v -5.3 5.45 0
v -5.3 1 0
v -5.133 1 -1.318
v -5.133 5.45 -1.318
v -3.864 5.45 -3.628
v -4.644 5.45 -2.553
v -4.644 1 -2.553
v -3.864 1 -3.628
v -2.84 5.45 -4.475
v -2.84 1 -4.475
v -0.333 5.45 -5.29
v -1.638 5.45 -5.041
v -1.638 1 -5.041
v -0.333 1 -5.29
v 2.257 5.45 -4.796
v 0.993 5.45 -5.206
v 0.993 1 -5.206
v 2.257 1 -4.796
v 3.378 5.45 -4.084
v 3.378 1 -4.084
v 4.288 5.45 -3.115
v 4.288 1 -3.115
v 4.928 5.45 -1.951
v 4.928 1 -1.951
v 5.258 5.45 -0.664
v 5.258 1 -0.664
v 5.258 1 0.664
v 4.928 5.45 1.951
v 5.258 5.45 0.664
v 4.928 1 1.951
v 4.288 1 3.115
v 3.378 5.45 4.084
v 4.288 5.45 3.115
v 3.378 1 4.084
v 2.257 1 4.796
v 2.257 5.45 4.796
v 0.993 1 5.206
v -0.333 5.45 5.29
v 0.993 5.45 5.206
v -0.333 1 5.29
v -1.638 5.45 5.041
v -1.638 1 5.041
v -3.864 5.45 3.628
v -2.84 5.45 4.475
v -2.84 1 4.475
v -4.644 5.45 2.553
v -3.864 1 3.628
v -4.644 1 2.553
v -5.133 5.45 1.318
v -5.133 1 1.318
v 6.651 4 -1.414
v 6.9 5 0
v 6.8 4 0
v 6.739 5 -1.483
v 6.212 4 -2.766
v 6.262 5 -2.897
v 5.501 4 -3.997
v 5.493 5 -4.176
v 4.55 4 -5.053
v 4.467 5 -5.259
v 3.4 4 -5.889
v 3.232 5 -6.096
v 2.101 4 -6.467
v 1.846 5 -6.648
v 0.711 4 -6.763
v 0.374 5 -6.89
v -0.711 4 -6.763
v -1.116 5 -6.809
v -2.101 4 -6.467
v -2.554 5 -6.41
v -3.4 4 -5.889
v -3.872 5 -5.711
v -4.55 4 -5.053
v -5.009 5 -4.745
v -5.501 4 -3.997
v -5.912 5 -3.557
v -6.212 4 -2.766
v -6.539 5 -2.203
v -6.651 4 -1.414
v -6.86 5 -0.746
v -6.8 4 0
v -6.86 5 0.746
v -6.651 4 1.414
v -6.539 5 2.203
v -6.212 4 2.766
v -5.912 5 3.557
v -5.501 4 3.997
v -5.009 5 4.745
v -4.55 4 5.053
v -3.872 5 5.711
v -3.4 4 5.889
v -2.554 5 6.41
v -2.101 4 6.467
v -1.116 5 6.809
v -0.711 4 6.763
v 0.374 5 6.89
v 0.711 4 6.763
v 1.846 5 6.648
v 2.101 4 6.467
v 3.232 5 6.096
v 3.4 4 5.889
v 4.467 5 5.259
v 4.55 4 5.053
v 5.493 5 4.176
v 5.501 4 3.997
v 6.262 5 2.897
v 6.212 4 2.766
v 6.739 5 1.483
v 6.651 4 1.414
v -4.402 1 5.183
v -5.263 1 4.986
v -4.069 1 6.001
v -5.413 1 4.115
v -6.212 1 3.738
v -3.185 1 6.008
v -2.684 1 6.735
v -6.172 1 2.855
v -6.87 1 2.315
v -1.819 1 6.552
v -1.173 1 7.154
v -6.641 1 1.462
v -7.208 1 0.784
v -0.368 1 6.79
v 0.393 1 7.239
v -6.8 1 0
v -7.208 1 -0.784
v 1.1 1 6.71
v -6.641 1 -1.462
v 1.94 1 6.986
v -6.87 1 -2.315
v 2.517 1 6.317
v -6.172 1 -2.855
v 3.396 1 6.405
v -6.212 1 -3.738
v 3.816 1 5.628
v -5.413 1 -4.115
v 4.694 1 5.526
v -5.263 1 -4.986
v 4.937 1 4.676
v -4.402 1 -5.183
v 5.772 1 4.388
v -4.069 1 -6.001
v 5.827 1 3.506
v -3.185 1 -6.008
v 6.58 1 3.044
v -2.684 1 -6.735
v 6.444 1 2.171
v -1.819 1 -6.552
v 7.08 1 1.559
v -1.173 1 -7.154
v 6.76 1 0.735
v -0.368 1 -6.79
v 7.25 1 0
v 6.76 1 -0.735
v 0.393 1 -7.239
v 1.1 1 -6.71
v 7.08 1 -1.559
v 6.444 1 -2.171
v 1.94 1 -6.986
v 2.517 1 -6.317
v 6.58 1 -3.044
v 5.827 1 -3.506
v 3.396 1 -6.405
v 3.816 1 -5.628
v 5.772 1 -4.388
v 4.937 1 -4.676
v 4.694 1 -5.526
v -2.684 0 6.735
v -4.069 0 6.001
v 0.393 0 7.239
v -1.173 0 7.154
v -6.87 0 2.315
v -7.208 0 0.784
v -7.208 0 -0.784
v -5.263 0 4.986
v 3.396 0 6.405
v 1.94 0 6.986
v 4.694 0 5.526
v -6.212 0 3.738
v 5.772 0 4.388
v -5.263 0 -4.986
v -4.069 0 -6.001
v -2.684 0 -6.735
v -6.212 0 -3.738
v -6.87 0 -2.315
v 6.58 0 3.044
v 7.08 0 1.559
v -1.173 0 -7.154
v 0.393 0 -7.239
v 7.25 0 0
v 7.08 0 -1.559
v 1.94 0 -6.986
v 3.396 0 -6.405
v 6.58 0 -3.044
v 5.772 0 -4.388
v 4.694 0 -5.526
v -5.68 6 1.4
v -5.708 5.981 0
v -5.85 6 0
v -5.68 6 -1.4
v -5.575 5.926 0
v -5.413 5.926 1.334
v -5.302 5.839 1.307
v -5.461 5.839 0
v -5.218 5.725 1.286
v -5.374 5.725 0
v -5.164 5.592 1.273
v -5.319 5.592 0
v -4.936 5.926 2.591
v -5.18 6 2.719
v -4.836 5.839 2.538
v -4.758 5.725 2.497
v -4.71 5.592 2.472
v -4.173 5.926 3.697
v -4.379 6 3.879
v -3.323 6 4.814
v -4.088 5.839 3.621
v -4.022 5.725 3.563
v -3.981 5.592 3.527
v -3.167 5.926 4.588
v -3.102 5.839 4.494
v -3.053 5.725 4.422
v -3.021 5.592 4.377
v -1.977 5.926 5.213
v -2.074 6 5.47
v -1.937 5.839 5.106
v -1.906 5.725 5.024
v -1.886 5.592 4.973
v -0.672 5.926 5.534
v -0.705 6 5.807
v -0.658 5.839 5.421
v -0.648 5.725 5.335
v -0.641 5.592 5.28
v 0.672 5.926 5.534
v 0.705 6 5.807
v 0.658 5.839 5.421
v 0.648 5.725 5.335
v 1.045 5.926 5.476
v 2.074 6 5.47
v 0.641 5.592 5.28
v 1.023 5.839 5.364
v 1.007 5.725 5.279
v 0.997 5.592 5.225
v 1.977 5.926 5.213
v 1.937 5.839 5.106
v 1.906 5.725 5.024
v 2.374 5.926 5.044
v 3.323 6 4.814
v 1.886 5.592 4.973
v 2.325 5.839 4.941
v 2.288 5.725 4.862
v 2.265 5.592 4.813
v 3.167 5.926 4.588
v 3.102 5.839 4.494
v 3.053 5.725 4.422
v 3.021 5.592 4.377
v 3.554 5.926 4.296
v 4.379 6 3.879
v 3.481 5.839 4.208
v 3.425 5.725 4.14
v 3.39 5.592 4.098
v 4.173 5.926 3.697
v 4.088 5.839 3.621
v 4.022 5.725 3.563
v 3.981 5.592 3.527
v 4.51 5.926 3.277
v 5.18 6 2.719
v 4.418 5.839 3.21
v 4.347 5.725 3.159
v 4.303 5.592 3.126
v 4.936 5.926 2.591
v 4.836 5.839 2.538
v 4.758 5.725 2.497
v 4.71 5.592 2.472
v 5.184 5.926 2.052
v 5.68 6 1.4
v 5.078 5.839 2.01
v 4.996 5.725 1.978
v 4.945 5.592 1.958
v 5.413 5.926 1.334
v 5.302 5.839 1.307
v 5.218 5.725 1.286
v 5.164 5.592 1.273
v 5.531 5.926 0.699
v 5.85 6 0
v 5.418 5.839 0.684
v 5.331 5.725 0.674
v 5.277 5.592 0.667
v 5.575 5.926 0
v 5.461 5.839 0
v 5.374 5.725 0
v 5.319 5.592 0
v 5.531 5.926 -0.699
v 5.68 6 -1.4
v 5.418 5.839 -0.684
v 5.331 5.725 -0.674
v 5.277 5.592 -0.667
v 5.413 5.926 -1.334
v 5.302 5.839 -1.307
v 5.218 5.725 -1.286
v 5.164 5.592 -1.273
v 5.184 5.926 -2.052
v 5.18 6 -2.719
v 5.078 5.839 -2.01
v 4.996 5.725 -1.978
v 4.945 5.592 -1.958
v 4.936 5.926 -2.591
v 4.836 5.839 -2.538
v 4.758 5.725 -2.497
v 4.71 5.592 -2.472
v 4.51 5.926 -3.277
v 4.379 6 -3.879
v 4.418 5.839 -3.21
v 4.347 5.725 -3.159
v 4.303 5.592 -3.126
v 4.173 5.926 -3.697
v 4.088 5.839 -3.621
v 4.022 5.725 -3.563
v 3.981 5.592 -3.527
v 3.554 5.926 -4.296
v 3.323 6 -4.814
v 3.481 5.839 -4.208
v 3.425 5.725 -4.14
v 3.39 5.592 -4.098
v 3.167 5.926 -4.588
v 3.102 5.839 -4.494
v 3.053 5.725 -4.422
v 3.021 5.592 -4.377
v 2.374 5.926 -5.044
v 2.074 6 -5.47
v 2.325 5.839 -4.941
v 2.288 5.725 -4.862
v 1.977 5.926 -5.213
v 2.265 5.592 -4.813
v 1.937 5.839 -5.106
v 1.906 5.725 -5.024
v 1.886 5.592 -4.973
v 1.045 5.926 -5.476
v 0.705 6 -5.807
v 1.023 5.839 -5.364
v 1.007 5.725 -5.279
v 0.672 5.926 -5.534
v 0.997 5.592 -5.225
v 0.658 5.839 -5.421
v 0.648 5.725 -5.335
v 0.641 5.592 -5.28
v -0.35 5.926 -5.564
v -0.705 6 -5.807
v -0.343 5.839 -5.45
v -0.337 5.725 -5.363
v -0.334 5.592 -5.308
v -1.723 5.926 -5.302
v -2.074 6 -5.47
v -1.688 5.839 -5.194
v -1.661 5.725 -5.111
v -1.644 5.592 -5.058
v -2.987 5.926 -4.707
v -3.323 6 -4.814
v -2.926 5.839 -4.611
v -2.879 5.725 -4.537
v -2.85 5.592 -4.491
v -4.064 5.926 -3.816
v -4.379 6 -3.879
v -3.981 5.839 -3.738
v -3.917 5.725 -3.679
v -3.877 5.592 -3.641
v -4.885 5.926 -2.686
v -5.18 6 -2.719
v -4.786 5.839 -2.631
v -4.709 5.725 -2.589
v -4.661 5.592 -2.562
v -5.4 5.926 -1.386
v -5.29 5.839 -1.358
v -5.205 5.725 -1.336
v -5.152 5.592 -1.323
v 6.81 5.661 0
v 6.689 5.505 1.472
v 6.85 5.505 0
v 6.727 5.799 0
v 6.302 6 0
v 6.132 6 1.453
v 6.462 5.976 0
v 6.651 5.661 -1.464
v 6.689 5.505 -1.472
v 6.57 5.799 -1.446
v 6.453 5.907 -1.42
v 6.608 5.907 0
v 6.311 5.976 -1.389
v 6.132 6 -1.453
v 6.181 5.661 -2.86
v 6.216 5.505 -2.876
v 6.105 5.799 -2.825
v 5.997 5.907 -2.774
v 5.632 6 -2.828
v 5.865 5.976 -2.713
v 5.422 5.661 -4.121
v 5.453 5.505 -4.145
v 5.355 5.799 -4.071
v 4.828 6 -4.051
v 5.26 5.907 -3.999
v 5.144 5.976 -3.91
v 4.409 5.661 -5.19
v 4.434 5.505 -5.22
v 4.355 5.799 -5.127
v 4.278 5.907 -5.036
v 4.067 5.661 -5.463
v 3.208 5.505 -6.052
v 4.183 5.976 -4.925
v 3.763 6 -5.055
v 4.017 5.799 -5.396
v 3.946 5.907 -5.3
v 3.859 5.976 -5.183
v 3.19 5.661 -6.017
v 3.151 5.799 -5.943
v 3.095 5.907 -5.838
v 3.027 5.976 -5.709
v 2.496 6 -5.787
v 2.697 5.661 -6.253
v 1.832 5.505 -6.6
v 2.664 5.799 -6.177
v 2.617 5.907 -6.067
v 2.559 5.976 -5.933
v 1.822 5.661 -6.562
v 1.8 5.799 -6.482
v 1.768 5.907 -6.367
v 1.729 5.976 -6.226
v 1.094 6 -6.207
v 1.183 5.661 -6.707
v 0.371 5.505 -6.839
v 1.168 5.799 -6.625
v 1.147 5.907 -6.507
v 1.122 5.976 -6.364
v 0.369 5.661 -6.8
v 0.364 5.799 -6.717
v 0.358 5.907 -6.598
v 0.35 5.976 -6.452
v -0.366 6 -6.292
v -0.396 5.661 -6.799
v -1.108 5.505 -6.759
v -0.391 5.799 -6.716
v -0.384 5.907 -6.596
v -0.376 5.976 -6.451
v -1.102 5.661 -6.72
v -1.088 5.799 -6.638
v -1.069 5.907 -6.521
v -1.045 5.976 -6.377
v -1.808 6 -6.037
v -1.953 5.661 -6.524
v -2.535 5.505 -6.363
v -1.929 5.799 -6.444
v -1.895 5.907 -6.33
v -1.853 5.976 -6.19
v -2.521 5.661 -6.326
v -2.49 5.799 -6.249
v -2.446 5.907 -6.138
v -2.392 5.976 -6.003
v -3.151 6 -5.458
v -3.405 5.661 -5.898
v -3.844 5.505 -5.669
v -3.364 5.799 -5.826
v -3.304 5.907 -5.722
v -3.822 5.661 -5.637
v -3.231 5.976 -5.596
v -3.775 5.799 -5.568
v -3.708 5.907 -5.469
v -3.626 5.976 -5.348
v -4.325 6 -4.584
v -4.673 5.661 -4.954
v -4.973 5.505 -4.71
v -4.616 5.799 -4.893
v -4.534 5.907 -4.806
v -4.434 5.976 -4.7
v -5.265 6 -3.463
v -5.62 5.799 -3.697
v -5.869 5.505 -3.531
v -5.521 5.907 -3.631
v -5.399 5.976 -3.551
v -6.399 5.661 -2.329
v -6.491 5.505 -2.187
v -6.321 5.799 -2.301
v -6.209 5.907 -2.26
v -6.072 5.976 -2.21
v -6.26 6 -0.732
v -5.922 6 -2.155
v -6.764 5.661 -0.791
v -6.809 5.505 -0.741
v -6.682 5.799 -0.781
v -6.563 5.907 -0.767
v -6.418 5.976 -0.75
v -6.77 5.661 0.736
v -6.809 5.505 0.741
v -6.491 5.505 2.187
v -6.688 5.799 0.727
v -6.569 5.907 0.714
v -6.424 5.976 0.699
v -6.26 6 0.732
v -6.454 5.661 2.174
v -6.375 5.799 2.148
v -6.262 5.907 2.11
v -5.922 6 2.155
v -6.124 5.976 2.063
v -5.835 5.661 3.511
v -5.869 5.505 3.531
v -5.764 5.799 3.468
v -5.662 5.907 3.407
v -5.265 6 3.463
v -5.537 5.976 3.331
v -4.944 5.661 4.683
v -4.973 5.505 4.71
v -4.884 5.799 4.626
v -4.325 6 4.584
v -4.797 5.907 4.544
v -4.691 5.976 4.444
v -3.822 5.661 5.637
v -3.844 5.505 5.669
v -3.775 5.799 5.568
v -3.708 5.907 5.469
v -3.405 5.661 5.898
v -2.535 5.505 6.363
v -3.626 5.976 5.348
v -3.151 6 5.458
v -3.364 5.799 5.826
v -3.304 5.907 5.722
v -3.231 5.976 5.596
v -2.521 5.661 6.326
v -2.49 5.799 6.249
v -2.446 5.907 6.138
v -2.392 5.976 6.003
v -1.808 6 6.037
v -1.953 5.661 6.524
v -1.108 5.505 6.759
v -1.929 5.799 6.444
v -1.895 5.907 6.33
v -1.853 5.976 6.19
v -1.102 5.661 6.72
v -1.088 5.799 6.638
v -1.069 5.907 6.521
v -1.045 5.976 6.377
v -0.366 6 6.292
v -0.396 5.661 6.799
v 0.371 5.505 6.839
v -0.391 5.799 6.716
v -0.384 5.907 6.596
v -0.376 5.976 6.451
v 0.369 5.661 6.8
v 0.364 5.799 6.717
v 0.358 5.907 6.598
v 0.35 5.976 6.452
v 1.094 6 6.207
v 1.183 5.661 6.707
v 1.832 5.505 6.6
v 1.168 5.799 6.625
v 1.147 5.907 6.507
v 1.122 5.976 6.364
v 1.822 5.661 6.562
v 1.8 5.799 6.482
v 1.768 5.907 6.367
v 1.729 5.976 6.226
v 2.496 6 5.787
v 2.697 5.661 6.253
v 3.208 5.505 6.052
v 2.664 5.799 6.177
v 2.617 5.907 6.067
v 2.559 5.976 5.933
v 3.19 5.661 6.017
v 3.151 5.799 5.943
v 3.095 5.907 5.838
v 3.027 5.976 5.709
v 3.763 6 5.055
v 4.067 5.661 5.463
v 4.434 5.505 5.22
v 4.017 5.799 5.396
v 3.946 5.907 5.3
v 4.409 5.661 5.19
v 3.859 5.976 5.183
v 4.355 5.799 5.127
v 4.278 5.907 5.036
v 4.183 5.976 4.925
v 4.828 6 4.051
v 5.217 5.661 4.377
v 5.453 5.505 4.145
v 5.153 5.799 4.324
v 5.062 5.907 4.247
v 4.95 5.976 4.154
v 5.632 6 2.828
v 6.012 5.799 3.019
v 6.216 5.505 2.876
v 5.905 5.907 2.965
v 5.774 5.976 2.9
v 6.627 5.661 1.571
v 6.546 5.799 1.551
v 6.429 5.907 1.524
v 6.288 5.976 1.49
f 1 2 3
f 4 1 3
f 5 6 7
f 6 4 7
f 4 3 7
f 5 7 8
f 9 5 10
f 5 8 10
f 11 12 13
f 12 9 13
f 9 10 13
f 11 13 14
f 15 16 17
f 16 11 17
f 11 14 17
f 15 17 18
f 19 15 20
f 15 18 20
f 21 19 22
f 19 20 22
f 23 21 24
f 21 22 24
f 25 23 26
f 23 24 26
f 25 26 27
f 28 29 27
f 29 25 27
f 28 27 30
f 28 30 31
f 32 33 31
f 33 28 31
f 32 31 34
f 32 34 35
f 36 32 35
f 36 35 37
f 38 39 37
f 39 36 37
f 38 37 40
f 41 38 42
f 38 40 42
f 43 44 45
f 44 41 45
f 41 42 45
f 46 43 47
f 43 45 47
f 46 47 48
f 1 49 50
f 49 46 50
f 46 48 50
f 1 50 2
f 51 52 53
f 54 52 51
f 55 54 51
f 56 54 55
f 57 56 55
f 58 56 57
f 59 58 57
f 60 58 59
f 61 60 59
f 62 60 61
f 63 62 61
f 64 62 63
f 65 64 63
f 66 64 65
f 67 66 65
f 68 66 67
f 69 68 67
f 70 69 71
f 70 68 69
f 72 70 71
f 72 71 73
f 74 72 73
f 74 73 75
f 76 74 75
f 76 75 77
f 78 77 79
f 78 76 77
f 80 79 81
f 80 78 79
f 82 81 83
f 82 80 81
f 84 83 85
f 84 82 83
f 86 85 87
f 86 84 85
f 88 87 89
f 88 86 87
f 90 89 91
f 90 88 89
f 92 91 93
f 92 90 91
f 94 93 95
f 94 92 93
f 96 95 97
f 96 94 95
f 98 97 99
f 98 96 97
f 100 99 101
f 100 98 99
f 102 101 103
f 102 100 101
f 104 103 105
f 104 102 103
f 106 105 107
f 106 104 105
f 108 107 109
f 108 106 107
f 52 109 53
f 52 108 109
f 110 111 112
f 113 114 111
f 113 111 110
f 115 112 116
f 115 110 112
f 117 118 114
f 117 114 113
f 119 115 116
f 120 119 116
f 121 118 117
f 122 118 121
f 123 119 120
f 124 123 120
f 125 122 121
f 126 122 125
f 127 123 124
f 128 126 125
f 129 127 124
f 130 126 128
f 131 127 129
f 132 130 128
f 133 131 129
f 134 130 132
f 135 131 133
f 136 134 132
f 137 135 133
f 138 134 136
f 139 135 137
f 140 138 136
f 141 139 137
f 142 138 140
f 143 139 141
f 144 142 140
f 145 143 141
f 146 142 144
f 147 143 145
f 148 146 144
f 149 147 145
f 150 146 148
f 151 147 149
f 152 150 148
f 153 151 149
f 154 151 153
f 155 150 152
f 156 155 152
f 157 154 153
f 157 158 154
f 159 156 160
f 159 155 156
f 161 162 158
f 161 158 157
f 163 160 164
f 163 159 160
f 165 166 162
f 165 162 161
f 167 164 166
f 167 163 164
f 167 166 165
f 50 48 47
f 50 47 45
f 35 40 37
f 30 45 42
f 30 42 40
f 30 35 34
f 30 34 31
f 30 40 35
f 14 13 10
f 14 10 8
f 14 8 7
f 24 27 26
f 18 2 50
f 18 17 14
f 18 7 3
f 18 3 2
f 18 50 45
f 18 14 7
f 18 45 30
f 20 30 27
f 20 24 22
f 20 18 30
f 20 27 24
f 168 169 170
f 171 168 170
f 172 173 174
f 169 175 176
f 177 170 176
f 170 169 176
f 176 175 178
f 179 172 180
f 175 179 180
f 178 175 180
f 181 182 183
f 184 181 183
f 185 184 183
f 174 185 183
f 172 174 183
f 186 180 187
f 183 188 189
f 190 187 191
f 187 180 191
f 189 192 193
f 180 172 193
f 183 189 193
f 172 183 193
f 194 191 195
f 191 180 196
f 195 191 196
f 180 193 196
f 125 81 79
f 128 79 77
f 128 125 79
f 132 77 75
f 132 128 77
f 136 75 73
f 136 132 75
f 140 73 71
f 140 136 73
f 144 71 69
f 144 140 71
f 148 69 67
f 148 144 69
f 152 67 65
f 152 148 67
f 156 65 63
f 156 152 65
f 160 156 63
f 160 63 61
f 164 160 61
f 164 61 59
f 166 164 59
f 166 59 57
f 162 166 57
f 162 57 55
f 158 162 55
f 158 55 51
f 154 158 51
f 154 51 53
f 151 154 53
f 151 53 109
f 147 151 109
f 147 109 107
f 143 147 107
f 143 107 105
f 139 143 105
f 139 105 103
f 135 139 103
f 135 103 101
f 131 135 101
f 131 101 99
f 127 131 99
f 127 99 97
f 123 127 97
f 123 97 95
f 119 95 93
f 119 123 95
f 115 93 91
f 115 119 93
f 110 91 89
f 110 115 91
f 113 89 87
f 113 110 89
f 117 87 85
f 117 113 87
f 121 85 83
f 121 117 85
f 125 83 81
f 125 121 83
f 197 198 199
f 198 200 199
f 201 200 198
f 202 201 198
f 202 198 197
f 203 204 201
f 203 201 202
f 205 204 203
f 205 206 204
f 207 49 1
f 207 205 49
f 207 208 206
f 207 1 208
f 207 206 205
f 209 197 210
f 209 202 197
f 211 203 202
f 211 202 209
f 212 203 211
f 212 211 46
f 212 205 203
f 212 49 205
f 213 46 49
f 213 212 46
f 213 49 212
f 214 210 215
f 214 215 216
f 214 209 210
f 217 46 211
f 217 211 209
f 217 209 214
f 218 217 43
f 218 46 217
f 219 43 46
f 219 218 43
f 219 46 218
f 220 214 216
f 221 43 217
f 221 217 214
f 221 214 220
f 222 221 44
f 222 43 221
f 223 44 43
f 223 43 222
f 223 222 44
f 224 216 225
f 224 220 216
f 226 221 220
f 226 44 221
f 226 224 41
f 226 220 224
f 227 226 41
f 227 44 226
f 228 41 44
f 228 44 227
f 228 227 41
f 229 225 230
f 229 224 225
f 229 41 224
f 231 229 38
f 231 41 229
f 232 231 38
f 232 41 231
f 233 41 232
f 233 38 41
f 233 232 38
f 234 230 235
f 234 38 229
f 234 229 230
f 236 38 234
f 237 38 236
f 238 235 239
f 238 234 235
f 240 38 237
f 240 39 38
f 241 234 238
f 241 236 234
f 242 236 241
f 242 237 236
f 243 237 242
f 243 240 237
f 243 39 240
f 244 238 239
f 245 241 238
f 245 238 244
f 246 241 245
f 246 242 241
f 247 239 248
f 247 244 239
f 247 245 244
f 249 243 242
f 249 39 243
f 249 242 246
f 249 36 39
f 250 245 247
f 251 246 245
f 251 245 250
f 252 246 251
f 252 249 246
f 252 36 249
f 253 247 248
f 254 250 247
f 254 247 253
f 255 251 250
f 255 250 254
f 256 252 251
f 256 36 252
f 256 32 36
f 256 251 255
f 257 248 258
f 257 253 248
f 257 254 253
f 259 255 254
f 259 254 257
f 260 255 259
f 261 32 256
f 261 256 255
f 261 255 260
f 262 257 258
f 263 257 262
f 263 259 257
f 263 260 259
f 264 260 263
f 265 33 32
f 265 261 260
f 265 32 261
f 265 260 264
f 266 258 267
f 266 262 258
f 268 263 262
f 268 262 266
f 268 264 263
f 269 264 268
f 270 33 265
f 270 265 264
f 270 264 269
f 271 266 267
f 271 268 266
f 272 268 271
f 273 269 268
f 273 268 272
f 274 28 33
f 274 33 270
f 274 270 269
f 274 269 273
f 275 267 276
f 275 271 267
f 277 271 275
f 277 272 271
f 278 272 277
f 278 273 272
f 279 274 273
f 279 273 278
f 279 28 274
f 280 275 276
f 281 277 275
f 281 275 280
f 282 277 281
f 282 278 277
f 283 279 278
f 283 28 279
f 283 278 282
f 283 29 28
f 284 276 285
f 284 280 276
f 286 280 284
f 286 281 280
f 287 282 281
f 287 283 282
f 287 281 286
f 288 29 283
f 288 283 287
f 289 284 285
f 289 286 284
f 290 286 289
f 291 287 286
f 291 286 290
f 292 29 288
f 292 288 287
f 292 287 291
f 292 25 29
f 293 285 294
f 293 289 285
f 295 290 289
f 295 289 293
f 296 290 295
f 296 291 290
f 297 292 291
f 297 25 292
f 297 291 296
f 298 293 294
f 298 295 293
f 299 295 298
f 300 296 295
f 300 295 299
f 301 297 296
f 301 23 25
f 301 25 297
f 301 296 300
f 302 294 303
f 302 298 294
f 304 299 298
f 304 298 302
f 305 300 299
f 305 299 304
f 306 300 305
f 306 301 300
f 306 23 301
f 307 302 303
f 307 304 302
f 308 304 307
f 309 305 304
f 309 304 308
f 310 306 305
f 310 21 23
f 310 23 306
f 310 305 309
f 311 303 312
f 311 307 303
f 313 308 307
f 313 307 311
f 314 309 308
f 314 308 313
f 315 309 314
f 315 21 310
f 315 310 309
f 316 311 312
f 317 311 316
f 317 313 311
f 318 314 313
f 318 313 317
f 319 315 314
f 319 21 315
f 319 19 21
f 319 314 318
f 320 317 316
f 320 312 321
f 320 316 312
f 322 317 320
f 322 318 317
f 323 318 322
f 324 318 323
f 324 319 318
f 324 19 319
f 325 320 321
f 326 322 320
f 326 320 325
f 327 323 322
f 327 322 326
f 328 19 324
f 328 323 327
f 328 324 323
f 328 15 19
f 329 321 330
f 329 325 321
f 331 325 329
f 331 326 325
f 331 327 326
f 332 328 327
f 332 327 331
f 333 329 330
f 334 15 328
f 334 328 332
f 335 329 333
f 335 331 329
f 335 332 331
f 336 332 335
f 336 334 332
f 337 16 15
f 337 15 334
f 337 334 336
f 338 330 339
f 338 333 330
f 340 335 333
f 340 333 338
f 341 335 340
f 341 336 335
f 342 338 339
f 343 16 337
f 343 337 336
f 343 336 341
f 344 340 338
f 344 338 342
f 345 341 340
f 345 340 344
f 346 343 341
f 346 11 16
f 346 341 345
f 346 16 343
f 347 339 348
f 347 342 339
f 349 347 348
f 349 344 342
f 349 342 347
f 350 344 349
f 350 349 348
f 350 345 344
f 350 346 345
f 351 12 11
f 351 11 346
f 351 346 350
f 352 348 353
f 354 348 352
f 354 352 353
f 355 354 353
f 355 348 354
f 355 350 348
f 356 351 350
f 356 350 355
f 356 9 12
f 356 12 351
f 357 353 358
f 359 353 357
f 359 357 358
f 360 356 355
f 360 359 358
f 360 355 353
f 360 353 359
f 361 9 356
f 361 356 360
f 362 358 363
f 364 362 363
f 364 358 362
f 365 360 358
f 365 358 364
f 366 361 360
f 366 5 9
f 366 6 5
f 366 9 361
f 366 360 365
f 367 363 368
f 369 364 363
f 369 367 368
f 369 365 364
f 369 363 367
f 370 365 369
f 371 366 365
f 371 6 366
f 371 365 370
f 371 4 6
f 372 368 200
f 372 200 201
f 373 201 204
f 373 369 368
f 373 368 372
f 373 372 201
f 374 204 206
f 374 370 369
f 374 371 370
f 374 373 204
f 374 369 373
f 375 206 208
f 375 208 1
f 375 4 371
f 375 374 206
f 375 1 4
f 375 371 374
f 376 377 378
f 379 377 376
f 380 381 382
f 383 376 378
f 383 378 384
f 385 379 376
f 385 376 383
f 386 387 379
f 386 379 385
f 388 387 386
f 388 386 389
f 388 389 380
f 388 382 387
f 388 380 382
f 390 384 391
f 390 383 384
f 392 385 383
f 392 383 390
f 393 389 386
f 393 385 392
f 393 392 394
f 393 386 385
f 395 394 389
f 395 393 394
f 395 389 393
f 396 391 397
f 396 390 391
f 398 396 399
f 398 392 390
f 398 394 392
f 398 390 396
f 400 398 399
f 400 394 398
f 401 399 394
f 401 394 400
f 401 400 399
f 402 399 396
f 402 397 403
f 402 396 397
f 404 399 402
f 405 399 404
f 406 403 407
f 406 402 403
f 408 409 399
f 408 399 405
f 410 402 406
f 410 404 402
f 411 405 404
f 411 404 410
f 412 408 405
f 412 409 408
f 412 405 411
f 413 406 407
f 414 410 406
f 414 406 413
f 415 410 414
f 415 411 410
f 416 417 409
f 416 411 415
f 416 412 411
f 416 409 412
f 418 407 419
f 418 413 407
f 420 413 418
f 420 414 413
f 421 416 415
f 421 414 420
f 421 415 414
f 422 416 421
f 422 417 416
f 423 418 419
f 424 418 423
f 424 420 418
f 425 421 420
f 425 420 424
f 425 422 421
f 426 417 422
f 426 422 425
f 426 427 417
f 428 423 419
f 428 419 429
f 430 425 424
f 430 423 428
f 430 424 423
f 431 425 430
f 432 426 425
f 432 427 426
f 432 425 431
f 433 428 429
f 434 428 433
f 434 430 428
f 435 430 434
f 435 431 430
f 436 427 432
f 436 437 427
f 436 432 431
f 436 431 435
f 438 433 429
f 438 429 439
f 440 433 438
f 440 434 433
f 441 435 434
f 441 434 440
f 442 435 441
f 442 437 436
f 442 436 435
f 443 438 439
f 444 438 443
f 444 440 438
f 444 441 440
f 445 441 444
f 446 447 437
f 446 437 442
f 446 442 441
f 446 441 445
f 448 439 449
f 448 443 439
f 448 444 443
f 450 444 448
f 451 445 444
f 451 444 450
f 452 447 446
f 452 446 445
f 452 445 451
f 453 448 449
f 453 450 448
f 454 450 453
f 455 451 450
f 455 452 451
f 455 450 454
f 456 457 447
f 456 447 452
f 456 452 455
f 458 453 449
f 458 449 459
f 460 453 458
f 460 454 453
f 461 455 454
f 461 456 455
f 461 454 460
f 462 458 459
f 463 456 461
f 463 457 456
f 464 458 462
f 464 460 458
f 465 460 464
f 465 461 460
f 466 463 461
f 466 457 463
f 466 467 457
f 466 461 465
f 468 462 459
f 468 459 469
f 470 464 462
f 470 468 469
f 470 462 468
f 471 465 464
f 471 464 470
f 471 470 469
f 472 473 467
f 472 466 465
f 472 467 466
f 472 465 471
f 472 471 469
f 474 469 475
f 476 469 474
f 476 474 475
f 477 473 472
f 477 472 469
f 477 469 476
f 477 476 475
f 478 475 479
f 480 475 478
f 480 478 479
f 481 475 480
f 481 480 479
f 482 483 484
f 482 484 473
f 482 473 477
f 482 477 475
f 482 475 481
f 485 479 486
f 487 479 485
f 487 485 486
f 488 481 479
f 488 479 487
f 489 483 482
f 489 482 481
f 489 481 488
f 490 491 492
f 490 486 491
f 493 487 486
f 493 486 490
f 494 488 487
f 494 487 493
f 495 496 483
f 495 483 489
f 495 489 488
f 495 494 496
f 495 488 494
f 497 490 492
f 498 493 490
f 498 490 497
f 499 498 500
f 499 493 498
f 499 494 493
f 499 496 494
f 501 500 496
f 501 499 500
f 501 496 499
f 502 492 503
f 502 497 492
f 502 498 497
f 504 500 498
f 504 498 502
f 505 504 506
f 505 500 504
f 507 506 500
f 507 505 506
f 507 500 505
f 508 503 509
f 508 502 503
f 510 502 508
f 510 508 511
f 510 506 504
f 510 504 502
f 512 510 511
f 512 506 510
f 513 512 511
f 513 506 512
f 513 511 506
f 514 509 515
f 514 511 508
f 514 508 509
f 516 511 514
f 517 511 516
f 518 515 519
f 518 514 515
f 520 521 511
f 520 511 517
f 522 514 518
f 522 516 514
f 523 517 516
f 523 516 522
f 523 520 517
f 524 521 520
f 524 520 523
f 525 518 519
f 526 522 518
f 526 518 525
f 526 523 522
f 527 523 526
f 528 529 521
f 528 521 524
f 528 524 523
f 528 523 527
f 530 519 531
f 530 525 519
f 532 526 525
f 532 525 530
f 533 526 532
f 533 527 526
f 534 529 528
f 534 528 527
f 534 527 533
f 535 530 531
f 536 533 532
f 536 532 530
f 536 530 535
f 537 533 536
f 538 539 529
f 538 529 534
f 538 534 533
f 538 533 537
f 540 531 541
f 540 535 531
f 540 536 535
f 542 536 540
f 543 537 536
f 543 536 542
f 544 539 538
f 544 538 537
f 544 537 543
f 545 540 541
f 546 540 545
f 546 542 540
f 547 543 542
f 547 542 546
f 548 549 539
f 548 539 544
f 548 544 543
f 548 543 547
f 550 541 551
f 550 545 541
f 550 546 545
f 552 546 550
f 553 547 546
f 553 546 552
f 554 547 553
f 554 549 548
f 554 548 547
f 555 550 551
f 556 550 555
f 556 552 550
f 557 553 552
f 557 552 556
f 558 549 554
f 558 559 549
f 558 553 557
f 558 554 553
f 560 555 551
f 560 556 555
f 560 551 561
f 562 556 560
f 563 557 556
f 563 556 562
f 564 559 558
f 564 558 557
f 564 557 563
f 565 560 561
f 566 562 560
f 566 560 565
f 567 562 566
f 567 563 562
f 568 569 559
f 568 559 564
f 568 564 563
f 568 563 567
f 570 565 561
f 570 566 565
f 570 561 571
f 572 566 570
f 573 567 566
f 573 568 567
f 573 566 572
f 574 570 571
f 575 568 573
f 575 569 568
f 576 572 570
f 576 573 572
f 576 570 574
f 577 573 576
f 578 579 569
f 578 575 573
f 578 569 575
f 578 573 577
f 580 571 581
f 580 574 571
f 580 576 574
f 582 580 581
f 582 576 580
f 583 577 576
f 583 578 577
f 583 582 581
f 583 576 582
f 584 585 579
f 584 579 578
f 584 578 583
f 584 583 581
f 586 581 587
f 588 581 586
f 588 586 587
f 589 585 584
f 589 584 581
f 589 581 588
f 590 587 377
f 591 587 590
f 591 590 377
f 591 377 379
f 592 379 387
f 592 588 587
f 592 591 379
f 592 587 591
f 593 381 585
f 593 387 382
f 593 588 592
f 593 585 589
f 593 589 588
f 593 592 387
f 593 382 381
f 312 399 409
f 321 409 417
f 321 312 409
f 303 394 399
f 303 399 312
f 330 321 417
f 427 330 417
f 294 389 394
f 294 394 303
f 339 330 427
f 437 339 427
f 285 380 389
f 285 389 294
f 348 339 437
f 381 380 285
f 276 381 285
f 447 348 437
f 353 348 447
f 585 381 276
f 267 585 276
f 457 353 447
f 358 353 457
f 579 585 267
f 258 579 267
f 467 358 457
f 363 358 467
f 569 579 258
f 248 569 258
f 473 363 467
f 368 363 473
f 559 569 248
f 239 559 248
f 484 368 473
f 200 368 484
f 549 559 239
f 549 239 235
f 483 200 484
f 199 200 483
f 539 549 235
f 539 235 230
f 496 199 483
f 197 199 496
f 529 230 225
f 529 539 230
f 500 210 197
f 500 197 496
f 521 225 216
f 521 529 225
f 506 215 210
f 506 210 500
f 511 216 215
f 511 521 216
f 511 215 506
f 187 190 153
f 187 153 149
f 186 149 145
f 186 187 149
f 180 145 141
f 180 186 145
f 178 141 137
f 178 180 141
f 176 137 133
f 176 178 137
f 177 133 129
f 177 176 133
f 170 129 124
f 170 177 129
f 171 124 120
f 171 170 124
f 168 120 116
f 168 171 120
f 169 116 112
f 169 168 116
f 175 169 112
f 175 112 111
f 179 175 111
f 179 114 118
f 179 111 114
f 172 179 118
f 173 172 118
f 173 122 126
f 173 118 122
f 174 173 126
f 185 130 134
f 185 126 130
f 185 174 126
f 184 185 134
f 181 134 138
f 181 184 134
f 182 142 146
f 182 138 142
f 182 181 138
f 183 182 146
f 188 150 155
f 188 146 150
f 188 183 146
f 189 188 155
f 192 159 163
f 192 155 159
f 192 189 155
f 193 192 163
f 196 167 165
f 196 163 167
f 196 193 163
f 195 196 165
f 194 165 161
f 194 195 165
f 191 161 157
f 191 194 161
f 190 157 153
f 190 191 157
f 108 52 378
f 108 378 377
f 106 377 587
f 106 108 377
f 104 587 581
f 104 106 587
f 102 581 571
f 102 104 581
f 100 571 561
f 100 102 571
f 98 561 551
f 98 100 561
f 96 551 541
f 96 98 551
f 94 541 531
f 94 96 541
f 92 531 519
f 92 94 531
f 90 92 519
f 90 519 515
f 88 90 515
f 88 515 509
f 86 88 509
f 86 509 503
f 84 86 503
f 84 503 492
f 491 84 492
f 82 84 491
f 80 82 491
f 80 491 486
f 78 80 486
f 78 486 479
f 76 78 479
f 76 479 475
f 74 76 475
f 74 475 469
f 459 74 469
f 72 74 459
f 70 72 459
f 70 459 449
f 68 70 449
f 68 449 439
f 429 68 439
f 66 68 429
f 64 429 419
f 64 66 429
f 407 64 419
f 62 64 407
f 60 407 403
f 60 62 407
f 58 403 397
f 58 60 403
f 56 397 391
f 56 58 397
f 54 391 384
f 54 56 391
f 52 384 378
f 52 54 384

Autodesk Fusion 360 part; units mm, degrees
sketch "Esboço1" plane through (0, 0, 0) normal (0, 1, 0) x (1, 0, 0)
  circle A0 centre (0, 0) radius 7.25
  dimension "d1" = 14.5
extrude "Extrusão1" add sketch "Esboço1" along normal blind 1
sketch "Esboço2" plane through (0, 1, 0) normal (0, 1, 0) x (-1, 0, 0)
  circle A0 centre (0, 0) radius 7.25
  circle A1 centre (0, 0) radius 6.8
  circle A2 centre (0, 0) radius 5.3
  dimension "d4" = 13.6
  dimension "d5" = -1.5
extrude "Extrusão2" add sketch "Esboço2" along normal blind 5 contours A1
sketch "Esboço3" plane through (0, 0, 0) normal (0, 0, 1) x (1, 0, 0)
  line L0 (6.8, 6) -> (6.8, 4)
  line L1 (6.8, 5) -> (6.9, 5)
  line L2 (6.9, 5) -> (6.8, 4)
  line L3 (6.9, 5) -> (6.8, 6)
revolve "Revolucionar1" add sketch "Esboço3" angle 360 about axis through (0, 1.75, 0) along (0, 1, 0)
fillet "Arredondamento1" radius 0.55 1 edges at (6.3398, 6, -2.459)
fillet "Arredondamento2" radius 0.55 1 edges at (4.9413, 6, 1.9166)
